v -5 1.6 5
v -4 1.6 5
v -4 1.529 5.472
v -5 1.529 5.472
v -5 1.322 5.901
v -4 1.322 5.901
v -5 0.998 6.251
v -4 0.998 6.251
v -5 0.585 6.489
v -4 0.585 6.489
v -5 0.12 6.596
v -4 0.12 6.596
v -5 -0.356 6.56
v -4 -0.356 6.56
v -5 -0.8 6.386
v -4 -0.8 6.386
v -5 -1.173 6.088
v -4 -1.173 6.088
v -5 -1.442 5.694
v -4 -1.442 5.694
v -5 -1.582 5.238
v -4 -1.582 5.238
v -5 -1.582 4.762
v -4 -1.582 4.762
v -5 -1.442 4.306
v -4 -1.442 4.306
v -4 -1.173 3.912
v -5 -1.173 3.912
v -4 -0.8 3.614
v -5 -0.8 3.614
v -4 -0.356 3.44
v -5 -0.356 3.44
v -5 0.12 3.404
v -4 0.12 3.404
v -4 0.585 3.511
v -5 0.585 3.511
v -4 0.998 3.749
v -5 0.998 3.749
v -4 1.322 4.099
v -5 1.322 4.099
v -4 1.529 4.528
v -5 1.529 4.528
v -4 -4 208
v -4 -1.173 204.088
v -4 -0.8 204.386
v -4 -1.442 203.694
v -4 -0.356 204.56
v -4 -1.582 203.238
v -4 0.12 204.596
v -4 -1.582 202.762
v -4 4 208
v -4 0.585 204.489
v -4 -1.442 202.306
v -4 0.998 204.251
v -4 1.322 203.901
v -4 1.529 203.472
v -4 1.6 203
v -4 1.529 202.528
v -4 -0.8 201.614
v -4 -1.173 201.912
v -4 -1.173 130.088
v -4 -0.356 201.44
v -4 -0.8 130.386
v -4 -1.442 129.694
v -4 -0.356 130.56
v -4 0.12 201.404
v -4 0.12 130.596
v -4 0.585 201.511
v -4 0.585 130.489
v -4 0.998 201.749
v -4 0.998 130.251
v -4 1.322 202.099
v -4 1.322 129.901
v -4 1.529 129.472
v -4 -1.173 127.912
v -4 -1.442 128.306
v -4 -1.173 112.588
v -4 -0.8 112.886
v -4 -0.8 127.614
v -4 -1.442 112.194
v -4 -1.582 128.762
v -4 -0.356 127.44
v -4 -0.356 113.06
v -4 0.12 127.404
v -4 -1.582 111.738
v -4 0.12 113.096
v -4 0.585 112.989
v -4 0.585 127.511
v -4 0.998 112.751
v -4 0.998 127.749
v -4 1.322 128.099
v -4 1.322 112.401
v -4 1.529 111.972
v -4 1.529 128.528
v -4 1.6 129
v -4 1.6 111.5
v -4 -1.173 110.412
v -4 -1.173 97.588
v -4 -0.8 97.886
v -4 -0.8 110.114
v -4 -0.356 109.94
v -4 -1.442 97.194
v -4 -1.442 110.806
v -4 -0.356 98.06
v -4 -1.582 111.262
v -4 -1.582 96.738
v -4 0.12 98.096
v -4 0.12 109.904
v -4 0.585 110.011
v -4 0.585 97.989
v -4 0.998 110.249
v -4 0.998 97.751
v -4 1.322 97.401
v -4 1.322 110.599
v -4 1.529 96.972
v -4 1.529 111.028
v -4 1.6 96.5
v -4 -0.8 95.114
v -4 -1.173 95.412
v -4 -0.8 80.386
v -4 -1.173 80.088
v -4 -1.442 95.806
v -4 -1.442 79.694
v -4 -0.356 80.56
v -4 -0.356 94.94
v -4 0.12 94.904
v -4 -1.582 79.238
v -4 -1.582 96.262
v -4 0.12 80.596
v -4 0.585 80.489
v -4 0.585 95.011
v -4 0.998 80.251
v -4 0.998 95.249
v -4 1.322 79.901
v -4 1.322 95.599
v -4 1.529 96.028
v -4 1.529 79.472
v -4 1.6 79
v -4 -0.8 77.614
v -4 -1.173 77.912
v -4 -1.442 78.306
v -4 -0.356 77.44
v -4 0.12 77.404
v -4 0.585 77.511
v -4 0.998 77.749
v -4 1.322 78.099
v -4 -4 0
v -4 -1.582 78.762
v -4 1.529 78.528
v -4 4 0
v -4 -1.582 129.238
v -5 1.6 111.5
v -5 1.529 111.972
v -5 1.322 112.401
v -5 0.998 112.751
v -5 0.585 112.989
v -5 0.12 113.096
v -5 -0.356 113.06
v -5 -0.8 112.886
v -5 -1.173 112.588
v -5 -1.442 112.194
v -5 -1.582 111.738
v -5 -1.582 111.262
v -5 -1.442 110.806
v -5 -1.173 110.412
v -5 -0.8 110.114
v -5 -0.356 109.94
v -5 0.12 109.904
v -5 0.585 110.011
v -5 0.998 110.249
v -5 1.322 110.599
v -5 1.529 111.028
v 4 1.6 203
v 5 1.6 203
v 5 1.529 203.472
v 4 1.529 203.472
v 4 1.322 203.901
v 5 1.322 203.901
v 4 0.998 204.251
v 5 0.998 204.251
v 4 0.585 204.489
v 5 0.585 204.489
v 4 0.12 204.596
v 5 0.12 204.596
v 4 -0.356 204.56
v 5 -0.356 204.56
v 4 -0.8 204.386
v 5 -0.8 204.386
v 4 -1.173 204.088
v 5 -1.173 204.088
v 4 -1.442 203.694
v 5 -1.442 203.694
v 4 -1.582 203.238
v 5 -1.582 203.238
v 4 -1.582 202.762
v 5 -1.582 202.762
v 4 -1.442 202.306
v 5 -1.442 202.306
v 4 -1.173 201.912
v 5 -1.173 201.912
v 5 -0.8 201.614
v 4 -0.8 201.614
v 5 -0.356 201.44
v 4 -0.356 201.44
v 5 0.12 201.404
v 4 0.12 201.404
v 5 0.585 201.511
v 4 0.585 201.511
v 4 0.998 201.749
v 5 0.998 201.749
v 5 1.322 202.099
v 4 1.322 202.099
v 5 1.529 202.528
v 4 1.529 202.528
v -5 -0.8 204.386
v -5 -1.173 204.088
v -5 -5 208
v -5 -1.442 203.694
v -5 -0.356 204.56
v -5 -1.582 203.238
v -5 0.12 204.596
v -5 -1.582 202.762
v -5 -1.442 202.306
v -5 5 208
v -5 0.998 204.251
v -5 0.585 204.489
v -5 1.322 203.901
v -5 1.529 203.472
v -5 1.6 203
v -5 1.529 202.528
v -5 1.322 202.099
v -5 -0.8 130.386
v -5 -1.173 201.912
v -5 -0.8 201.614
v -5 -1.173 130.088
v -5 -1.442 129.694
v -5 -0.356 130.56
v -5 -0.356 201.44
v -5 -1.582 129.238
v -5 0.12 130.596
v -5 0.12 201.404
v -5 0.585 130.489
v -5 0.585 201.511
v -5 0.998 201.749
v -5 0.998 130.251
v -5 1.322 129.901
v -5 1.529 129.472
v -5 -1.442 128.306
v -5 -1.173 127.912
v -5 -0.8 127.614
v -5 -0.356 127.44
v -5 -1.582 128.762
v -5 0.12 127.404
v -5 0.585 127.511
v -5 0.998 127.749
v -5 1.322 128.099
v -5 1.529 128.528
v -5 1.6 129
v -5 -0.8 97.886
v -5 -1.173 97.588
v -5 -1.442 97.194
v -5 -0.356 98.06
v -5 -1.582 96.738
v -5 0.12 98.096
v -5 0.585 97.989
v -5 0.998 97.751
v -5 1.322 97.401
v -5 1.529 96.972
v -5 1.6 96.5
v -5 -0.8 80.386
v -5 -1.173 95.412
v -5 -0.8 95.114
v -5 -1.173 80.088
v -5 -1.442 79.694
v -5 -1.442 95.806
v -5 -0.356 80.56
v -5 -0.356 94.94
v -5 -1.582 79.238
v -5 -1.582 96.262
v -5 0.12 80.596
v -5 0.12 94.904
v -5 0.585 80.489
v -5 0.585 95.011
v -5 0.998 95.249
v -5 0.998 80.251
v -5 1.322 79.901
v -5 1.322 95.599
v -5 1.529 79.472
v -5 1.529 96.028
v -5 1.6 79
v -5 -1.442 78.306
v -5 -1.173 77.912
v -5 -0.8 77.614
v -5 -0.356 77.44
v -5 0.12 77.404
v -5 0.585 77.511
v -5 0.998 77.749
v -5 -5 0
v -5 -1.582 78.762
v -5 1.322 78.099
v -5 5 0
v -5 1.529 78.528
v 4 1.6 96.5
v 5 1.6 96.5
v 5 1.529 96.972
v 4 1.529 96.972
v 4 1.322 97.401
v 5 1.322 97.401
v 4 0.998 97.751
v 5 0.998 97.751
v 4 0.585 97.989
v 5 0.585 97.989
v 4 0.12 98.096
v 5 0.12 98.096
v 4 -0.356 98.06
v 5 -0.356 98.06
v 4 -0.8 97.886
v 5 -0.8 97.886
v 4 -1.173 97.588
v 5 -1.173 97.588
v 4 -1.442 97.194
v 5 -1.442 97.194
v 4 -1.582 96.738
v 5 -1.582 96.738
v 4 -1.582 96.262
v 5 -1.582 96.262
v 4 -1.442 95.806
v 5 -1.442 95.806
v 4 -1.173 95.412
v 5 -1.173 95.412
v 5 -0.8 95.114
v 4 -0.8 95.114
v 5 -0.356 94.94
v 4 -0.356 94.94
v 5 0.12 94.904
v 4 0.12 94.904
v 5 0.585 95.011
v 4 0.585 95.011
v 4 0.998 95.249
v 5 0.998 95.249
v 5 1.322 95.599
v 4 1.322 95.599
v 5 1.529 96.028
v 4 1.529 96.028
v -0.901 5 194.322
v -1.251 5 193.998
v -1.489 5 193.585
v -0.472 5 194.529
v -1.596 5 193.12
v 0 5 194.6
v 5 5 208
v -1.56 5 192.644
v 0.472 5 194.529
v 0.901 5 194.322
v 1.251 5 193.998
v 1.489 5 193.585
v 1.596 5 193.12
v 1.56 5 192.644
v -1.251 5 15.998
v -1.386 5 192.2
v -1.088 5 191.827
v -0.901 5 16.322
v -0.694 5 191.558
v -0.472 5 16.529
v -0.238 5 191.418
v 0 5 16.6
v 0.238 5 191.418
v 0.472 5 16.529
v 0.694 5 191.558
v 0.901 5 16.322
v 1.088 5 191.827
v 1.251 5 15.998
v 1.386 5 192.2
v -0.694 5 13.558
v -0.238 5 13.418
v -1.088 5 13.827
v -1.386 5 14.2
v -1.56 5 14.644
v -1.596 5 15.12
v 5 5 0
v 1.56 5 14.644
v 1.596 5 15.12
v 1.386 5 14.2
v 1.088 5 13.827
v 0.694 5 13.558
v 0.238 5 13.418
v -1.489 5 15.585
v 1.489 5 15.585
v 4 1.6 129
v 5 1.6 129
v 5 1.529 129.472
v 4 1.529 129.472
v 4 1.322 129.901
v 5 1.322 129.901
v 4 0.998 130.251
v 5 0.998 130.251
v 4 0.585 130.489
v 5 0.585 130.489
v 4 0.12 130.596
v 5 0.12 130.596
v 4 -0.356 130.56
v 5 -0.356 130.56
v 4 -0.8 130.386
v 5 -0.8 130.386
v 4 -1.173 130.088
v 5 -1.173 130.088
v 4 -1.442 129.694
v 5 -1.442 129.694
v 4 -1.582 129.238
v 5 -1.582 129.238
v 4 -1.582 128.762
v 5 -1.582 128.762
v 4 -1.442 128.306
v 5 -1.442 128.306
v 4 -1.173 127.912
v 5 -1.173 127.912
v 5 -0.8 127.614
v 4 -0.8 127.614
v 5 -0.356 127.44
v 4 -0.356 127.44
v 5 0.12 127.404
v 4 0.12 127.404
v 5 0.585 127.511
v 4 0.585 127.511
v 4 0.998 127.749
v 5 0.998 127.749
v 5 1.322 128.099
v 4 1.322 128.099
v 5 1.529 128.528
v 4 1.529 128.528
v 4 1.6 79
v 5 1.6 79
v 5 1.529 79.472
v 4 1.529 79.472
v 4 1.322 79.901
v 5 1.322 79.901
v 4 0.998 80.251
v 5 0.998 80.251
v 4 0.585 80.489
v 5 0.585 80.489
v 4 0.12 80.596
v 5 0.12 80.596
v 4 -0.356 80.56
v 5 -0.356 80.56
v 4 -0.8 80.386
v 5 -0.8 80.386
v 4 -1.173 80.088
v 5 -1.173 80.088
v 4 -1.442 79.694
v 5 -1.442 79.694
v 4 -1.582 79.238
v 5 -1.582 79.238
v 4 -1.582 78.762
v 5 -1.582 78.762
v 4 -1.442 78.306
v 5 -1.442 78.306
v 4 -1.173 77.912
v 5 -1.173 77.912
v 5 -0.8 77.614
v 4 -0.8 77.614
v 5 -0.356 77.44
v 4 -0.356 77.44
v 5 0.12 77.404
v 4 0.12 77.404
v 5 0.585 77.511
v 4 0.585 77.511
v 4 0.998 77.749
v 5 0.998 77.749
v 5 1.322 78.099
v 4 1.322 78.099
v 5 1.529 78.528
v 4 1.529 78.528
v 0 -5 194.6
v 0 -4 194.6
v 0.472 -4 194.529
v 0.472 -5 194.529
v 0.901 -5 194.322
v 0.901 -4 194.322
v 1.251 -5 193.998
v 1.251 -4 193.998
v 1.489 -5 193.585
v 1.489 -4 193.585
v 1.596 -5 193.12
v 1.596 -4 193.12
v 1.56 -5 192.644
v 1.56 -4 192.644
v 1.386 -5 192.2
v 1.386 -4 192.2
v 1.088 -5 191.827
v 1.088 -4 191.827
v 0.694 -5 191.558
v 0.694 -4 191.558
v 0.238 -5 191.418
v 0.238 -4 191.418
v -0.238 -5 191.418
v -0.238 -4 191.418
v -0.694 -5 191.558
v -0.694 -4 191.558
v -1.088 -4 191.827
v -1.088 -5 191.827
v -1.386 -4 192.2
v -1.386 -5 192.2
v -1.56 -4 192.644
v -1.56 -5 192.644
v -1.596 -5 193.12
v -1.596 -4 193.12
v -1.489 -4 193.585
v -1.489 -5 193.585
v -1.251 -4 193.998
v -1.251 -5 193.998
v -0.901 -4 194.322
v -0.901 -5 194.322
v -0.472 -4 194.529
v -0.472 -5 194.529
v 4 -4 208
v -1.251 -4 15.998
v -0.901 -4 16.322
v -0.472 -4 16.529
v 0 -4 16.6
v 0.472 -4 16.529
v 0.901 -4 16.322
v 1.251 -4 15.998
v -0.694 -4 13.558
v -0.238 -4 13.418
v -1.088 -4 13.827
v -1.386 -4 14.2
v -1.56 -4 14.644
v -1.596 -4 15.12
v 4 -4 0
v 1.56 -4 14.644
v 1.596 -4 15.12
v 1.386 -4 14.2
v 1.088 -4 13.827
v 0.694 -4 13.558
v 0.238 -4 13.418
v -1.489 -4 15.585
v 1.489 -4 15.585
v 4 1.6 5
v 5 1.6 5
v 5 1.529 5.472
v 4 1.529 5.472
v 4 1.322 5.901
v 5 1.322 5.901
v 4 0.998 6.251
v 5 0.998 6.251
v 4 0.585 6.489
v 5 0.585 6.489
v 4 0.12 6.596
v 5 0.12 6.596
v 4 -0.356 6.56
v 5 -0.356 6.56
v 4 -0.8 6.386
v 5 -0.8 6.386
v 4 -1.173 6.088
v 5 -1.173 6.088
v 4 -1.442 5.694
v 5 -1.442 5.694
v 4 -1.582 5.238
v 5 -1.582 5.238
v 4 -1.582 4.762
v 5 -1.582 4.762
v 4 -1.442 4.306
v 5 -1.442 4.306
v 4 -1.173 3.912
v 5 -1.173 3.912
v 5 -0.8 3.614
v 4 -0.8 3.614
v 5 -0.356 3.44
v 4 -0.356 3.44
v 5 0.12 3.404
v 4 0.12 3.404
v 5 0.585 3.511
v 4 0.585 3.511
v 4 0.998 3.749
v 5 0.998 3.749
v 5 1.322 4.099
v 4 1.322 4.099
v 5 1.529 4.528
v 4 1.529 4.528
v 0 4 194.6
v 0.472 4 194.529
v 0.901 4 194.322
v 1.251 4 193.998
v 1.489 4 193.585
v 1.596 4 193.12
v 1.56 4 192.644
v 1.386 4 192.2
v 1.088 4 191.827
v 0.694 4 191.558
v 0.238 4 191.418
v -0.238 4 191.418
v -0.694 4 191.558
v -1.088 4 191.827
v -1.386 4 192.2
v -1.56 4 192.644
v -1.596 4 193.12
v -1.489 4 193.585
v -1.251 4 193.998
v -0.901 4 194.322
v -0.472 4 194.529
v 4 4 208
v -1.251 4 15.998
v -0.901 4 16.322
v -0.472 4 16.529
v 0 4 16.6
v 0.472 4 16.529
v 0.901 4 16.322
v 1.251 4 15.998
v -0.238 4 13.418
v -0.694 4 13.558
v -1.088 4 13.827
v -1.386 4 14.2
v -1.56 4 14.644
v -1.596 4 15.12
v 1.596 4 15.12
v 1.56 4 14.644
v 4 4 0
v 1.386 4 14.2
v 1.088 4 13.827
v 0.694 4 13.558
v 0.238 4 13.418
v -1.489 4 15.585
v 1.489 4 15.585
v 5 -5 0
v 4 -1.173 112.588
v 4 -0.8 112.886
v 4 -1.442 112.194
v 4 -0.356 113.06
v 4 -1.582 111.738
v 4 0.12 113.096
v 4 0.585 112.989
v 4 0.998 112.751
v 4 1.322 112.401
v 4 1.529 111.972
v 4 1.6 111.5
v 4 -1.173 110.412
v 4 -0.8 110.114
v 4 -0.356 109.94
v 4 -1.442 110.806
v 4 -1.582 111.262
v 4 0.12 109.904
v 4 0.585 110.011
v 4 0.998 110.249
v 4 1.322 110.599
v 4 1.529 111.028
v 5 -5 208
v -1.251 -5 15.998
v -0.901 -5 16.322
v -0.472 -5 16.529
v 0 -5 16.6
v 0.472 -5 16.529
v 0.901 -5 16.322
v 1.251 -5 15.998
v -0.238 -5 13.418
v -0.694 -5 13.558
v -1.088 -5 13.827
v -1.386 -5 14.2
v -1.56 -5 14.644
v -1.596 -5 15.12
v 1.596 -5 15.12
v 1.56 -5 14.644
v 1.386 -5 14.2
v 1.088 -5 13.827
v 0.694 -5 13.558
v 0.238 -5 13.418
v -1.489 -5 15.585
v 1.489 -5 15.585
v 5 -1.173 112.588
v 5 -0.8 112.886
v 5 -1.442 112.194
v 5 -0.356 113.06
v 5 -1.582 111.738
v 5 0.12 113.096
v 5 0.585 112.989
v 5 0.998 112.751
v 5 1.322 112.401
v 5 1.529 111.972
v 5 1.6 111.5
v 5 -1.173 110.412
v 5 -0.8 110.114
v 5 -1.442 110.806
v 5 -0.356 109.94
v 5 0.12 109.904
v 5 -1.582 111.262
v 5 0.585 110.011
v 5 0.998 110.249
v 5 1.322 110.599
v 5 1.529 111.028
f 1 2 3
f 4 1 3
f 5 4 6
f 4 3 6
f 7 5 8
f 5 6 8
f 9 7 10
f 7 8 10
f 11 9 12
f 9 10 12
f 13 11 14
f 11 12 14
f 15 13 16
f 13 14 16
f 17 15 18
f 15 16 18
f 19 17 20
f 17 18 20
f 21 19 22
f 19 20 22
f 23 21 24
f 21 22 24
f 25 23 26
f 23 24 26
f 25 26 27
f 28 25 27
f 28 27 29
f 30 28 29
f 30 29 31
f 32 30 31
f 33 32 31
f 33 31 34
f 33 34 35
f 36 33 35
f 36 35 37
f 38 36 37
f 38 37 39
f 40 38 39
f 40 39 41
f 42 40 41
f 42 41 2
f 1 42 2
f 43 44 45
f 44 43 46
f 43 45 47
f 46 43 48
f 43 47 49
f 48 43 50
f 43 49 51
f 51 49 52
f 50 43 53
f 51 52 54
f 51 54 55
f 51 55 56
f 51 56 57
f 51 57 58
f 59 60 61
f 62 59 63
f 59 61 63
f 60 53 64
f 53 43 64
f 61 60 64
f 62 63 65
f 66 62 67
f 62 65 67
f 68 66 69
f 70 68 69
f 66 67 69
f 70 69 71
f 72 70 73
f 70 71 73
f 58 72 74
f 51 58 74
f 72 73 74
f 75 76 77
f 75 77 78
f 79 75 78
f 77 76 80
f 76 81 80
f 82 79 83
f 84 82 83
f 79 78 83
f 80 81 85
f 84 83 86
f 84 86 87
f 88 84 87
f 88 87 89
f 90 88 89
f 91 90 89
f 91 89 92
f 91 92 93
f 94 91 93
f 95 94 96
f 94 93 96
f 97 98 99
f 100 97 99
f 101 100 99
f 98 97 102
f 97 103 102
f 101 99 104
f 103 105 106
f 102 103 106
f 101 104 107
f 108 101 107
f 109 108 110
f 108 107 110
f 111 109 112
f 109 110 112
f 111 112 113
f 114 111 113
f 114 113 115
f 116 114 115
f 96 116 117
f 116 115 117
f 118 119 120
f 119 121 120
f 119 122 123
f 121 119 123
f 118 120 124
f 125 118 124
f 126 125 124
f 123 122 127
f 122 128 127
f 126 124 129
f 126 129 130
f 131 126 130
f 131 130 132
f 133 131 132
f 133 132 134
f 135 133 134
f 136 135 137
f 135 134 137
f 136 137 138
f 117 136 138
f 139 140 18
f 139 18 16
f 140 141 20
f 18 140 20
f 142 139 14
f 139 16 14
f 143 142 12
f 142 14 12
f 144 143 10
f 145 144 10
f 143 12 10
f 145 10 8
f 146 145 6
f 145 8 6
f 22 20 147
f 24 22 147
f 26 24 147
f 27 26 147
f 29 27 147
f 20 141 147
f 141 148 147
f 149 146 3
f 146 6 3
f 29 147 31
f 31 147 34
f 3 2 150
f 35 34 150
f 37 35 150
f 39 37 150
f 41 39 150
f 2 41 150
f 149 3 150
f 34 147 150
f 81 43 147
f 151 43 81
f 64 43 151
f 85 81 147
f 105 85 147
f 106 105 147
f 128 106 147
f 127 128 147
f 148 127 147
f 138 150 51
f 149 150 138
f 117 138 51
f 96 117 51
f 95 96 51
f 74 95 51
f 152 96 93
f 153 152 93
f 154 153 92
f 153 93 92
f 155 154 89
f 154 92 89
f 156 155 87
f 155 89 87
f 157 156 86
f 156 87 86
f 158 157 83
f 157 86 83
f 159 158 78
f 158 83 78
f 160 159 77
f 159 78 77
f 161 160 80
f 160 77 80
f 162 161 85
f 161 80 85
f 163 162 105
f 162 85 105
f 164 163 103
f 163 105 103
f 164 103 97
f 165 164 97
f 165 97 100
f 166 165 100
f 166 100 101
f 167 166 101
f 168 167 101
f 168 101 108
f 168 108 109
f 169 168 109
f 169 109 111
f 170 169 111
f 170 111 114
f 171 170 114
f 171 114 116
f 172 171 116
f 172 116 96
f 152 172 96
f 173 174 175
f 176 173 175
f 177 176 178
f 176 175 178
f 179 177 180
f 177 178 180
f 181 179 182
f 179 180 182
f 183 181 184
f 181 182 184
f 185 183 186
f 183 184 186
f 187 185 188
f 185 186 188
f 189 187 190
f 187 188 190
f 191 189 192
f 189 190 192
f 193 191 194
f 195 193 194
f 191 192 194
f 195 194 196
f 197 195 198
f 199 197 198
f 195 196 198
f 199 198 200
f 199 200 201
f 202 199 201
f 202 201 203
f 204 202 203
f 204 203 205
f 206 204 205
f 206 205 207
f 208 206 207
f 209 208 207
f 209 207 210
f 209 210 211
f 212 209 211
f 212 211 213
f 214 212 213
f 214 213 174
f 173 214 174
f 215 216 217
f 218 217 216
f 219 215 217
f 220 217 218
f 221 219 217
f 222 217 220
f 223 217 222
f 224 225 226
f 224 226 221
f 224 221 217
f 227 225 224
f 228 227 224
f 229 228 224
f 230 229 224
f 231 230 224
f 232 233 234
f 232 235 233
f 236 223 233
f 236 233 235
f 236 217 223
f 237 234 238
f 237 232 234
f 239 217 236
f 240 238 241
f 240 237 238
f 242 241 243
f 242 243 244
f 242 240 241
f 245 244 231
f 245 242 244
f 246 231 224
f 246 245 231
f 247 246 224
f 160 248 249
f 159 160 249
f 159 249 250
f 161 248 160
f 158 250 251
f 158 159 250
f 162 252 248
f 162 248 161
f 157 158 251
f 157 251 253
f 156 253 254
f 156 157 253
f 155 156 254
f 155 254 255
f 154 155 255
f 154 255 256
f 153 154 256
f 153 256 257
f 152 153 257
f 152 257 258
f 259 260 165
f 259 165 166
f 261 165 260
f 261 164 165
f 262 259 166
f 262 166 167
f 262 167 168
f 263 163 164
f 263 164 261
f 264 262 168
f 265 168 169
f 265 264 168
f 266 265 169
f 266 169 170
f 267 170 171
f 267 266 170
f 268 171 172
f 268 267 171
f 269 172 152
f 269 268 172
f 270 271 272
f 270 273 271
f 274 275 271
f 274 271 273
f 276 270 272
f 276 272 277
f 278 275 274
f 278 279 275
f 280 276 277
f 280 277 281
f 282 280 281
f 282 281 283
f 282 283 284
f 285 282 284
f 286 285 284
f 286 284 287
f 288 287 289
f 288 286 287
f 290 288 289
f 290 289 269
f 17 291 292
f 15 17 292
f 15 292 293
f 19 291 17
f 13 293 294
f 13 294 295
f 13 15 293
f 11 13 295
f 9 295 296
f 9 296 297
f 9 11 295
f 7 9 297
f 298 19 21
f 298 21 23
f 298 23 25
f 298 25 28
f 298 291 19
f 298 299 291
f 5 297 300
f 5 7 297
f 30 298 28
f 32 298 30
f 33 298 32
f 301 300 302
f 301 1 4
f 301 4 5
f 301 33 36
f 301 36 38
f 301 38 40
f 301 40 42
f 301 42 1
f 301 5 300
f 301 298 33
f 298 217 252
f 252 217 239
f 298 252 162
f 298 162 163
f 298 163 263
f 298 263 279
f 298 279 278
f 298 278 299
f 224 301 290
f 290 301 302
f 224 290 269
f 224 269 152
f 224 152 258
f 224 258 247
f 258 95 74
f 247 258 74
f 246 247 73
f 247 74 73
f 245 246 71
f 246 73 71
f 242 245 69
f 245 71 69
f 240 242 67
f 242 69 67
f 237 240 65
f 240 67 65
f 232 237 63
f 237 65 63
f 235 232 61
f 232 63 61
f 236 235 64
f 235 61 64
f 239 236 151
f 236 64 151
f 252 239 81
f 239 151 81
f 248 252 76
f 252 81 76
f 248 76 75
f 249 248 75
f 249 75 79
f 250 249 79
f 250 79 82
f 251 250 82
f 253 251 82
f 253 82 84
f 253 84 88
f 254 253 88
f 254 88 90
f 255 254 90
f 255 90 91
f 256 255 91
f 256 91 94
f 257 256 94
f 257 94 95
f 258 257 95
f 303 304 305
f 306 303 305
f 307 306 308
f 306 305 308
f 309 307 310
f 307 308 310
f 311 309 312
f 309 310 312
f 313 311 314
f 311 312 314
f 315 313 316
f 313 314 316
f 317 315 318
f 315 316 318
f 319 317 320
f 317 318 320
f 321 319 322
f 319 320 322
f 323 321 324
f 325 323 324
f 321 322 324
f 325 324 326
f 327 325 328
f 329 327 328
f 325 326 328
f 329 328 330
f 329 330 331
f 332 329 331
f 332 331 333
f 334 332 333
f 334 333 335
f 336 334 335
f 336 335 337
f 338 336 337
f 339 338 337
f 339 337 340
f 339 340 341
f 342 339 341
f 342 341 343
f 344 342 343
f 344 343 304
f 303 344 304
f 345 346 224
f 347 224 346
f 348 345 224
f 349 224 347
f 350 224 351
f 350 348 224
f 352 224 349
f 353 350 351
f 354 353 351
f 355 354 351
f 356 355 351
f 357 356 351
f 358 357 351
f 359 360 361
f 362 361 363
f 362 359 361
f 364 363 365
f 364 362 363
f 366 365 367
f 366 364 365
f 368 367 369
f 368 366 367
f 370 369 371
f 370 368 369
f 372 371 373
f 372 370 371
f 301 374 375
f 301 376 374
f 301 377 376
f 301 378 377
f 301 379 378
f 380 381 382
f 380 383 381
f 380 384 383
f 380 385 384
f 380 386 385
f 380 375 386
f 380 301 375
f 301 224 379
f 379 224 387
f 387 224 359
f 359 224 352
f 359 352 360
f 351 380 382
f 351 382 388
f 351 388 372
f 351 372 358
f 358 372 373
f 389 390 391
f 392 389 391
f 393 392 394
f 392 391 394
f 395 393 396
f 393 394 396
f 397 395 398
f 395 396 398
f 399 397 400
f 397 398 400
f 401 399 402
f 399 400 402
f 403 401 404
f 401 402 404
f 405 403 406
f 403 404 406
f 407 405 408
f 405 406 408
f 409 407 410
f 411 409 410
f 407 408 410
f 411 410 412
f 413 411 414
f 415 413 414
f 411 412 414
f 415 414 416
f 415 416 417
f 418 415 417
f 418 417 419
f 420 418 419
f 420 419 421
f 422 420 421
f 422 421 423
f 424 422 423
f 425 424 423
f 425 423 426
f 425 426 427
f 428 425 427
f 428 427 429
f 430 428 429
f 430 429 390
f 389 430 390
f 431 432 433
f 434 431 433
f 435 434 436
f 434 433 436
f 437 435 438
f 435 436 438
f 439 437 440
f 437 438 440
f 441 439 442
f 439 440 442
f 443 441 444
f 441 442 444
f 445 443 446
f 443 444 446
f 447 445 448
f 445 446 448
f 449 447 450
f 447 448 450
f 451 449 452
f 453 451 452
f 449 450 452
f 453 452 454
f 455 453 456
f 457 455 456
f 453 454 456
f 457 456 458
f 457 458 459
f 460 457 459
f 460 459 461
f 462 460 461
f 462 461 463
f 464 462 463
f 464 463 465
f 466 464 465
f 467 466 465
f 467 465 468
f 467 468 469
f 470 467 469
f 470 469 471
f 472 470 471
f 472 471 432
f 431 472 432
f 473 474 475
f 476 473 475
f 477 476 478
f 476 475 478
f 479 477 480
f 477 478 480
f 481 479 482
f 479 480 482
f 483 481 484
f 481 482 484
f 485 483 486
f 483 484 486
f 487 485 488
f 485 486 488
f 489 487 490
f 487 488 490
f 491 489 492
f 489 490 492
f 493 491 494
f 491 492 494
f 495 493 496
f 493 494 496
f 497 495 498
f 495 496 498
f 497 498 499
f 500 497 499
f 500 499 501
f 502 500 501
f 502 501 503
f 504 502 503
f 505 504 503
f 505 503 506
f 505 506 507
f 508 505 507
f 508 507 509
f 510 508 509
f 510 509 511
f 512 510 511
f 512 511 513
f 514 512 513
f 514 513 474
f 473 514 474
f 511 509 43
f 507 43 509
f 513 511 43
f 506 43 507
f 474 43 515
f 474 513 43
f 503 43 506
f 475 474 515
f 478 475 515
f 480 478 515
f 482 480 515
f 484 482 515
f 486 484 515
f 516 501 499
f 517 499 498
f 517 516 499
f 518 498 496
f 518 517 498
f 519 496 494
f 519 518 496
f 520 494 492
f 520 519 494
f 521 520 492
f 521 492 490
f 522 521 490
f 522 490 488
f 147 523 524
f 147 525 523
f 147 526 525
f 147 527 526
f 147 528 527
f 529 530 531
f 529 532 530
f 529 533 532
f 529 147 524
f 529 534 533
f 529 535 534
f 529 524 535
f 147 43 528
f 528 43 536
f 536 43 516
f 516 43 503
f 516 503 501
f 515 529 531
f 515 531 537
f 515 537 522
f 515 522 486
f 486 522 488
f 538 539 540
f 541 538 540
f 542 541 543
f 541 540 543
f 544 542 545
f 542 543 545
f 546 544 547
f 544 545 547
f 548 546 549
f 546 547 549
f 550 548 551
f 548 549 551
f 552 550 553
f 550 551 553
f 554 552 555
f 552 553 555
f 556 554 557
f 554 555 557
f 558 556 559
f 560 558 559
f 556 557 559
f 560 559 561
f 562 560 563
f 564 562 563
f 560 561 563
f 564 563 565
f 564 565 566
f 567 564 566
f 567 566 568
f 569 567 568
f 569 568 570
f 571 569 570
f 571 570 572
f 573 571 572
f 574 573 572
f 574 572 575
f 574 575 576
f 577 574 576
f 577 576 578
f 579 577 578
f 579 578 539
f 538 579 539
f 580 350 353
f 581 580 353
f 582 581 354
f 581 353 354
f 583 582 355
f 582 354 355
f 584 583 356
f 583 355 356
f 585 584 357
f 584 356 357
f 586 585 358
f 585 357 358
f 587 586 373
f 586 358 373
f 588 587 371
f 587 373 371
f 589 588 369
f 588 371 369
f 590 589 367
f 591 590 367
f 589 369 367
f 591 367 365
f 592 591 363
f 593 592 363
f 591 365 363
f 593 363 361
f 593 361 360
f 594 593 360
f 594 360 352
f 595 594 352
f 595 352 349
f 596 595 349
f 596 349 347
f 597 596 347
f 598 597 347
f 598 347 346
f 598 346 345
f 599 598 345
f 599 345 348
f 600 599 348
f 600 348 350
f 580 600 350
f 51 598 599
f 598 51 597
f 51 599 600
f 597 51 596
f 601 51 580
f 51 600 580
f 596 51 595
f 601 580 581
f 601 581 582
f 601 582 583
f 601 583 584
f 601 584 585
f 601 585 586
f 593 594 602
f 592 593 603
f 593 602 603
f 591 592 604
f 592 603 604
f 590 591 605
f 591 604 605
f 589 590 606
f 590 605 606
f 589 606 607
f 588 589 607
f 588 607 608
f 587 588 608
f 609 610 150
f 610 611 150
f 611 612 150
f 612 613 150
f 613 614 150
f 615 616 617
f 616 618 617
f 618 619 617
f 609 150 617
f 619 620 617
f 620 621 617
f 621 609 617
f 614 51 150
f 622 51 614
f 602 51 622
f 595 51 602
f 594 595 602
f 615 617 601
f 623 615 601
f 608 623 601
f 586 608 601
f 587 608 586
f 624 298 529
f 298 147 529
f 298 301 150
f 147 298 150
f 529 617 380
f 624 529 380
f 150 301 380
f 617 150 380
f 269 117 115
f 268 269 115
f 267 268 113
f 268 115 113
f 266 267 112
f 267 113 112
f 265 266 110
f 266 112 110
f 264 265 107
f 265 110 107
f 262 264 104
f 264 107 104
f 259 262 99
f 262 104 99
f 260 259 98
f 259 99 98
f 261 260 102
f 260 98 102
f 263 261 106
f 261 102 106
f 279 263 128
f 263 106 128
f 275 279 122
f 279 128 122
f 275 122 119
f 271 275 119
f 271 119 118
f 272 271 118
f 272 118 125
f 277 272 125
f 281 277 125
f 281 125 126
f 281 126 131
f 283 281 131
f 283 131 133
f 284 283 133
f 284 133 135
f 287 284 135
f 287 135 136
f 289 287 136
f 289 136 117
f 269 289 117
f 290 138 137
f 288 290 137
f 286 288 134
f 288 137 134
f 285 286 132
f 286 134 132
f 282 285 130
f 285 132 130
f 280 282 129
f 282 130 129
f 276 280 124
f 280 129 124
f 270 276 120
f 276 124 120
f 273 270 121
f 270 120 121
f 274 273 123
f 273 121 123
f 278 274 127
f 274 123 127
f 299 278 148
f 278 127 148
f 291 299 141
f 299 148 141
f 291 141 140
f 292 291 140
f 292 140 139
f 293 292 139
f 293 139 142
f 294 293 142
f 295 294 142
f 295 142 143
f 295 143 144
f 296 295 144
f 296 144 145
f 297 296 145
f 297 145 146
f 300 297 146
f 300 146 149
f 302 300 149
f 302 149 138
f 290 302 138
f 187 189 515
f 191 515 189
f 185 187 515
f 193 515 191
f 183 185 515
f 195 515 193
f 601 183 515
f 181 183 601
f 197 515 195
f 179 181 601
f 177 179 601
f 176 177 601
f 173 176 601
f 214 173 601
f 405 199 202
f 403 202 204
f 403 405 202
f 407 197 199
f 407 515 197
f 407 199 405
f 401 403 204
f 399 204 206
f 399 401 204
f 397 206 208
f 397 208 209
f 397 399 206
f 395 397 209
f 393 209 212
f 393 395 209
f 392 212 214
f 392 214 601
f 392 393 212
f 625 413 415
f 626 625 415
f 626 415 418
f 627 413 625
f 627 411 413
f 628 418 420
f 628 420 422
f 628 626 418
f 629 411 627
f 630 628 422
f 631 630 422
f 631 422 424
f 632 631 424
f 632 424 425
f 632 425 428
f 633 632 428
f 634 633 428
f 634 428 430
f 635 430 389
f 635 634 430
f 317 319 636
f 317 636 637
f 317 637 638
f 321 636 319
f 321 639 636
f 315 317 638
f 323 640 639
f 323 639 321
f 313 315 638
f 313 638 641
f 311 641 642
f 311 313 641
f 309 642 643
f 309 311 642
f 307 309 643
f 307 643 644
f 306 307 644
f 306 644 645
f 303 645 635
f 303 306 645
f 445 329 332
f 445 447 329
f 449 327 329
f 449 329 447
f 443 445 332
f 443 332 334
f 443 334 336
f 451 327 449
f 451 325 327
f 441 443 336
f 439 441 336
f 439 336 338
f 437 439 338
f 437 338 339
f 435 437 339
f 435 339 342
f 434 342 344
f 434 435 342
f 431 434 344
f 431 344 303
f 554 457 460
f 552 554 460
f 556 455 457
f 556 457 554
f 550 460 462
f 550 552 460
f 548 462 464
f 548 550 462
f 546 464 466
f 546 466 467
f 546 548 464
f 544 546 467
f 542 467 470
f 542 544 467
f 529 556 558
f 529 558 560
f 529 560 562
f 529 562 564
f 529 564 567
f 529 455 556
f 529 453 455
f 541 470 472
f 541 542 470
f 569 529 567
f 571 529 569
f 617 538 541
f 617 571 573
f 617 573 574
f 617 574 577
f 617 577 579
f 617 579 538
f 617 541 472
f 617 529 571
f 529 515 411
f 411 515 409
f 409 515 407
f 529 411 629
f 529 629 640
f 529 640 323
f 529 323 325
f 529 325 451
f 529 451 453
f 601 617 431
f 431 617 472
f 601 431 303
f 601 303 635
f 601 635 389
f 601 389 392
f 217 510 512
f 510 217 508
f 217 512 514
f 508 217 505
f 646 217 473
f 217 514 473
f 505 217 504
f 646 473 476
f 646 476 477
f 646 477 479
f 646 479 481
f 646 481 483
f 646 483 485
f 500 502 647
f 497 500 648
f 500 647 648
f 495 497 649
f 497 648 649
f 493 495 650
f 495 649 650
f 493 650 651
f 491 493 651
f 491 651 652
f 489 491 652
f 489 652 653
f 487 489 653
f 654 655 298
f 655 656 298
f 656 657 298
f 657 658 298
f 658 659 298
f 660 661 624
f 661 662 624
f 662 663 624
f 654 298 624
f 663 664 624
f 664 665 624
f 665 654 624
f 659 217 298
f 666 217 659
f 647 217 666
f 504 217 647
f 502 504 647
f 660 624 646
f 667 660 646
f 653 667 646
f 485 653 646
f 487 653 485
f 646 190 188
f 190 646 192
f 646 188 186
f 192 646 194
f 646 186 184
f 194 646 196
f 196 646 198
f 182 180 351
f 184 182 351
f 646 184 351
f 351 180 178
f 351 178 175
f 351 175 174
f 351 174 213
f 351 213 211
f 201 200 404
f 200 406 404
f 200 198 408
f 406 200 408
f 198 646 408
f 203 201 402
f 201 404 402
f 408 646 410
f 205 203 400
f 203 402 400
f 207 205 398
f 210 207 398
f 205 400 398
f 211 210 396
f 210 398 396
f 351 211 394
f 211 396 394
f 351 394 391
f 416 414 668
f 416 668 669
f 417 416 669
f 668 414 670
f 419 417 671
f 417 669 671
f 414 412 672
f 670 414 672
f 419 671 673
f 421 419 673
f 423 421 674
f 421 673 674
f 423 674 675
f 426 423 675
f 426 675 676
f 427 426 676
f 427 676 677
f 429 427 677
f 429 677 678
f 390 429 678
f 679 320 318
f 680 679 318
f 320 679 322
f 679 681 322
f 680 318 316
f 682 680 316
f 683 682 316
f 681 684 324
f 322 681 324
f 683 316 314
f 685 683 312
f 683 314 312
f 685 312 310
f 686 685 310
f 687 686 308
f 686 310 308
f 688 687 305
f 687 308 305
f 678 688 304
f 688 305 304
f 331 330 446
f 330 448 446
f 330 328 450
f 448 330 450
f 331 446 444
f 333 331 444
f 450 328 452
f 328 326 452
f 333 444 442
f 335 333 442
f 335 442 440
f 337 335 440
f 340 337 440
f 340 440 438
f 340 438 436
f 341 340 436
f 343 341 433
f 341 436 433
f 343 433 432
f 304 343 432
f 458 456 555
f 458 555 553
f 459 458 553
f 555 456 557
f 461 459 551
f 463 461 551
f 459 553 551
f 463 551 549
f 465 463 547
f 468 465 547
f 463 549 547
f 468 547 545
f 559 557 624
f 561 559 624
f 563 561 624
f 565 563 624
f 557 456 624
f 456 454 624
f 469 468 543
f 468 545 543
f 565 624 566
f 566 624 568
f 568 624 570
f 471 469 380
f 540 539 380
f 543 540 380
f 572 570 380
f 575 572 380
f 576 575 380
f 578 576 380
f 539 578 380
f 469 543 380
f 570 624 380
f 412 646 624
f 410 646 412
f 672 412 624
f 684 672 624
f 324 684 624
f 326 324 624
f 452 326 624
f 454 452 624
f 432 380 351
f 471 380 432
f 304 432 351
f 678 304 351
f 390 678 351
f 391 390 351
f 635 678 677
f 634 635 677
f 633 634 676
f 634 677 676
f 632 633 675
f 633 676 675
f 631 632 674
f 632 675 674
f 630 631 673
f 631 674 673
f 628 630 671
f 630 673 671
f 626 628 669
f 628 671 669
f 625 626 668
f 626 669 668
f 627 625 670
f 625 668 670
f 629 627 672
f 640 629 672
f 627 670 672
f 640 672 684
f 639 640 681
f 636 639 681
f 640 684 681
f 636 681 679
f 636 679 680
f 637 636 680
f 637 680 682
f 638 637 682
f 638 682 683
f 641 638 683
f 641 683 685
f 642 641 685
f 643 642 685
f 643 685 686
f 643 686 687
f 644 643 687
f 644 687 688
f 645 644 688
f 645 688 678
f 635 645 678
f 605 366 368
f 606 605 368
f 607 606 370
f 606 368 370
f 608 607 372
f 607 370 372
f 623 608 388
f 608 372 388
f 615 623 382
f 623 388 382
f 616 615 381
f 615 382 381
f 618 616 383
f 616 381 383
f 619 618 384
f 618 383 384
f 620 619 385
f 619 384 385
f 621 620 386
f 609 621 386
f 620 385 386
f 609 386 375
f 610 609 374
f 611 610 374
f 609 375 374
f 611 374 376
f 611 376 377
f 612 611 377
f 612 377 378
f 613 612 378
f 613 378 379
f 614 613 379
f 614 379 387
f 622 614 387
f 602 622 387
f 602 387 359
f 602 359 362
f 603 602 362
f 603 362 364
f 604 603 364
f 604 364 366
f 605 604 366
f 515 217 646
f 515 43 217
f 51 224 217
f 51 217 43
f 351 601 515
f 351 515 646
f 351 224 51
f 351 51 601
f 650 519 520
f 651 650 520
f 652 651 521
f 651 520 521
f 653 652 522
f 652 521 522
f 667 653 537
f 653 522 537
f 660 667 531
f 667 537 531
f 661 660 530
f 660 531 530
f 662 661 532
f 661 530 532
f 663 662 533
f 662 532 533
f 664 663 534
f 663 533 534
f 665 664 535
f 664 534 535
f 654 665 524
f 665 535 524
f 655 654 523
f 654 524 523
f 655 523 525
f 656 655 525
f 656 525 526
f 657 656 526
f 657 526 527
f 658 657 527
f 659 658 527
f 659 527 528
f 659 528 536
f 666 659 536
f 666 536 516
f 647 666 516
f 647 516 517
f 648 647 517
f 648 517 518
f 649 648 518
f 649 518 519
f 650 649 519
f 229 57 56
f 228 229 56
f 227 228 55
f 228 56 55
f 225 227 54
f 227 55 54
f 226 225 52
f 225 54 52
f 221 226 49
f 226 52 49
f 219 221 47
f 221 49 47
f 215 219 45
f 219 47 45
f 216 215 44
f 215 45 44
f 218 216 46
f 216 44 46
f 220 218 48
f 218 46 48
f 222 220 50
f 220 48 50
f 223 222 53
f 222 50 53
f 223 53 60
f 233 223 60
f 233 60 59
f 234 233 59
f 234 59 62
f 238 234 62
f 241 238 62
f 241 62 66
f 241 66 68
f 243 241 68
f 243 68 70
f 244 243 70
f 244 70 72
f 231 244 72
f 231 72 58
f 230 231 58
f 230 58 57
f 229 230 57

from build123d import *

# Parameters (mm, degrees)
SKETCH_1_W          = 10
SKETCH_1_H          = 10
SKETCH_1_W_2        = 8
SKETCH_1_H_2        = 8
EXTRUDE_1_DEPTH     = 208
SKETCH_2_R          = 1.6
CUT_EXTRUDE_1_DEPTH = 209.300264042
SKETCH_3_R          = 1.6
CUT_EXTRUDE_2_DEPTH = 209.300264042
SKETCH_4_R          = 1.6
CUT_EXTRUDE_3_DEPTH = 209.300264042


with BuildPart() as part:
    # ｽｹｯﾁ1 → ﾎﾞｽ - 押し出し1 (new body)
    with BuildSketch(Plane.XY):
        Rectangle(SKETCH_1_W, SKETCH_1_H)
        Rectangle(SKETCH_1_W_2, SKETCH_1_H_2, mode=Mode.SUBTRACT)
    extrude(amount=EXTRUDE_1_DEPTH)

    # ｽｹｯﾁ2 → ｶｯﾄ - 押し出し1 (cut, through all)
    with BuildSketch(Plane(origin=(5, 0, 0), x_dir=(0, 0, -1), z_dir=(1, 0, 0))):
        with Locations(Location((-203, 0, 0), (0, 0, 90))):
            Circle(SKETCH_2_R)
        with Locations(Location((-111.5, 0, 0), (0, 0, 90))):
            Circle(SKETCH_2_R)
        with Locations(Location((-96.5, 0, 0), (0, 0, 90))):
            Circle(SKETCH_2_R)
        with Locations(Location((-5, 0, 0), (0, 0, 90))):
            Circle(SKETCH_2_R)
    extrude(amount=-CUT_EXTRUDE_1_DEPTH, mode=Mode.SUBTRACT)

    # ｽｹｯﾁ3 → ｶｯﾄ - 押し出し2 (cut, through all)
    with BuildSketch(Plane(origin=(0, 5, 0), x_dir=(1, 0, 0), z_dir=(0, 1, 0))):
        with Locations(Location((0, -193, 0), (0, 0, 270))):
            Circle(SKETCH_3_R)
        with Locations(Location((0, -15, 0), (0, 0, 270))):
            Circle(SKETCH_3_R)
    extrude(amount=-CUT_EXTRUDE_2_DEPTH, mode=Mode.SUBTRACT)

    # ｽｹｯﾁ4 → ｶｯﾄ - 押し出し3 (cut, through all)
    with BuildSketch(Plane(origin=(5, 0, 0), x_dir=(0, 0, -1), z_dir=(1, 0, 0))):
        with Locations(Location((-129, 0, 0), (0, 0, 90))):
            Circle(SKETCH_4_R)
        with Locations(Location((-79, 0, 0), (0, 0, 90))):
            Circle(SKETCH_4_R)
    extrude(amount=-CUT_EXTRUDE_3_DEPTH, mode=Mode.SUBTRACT)


solid = part.part
